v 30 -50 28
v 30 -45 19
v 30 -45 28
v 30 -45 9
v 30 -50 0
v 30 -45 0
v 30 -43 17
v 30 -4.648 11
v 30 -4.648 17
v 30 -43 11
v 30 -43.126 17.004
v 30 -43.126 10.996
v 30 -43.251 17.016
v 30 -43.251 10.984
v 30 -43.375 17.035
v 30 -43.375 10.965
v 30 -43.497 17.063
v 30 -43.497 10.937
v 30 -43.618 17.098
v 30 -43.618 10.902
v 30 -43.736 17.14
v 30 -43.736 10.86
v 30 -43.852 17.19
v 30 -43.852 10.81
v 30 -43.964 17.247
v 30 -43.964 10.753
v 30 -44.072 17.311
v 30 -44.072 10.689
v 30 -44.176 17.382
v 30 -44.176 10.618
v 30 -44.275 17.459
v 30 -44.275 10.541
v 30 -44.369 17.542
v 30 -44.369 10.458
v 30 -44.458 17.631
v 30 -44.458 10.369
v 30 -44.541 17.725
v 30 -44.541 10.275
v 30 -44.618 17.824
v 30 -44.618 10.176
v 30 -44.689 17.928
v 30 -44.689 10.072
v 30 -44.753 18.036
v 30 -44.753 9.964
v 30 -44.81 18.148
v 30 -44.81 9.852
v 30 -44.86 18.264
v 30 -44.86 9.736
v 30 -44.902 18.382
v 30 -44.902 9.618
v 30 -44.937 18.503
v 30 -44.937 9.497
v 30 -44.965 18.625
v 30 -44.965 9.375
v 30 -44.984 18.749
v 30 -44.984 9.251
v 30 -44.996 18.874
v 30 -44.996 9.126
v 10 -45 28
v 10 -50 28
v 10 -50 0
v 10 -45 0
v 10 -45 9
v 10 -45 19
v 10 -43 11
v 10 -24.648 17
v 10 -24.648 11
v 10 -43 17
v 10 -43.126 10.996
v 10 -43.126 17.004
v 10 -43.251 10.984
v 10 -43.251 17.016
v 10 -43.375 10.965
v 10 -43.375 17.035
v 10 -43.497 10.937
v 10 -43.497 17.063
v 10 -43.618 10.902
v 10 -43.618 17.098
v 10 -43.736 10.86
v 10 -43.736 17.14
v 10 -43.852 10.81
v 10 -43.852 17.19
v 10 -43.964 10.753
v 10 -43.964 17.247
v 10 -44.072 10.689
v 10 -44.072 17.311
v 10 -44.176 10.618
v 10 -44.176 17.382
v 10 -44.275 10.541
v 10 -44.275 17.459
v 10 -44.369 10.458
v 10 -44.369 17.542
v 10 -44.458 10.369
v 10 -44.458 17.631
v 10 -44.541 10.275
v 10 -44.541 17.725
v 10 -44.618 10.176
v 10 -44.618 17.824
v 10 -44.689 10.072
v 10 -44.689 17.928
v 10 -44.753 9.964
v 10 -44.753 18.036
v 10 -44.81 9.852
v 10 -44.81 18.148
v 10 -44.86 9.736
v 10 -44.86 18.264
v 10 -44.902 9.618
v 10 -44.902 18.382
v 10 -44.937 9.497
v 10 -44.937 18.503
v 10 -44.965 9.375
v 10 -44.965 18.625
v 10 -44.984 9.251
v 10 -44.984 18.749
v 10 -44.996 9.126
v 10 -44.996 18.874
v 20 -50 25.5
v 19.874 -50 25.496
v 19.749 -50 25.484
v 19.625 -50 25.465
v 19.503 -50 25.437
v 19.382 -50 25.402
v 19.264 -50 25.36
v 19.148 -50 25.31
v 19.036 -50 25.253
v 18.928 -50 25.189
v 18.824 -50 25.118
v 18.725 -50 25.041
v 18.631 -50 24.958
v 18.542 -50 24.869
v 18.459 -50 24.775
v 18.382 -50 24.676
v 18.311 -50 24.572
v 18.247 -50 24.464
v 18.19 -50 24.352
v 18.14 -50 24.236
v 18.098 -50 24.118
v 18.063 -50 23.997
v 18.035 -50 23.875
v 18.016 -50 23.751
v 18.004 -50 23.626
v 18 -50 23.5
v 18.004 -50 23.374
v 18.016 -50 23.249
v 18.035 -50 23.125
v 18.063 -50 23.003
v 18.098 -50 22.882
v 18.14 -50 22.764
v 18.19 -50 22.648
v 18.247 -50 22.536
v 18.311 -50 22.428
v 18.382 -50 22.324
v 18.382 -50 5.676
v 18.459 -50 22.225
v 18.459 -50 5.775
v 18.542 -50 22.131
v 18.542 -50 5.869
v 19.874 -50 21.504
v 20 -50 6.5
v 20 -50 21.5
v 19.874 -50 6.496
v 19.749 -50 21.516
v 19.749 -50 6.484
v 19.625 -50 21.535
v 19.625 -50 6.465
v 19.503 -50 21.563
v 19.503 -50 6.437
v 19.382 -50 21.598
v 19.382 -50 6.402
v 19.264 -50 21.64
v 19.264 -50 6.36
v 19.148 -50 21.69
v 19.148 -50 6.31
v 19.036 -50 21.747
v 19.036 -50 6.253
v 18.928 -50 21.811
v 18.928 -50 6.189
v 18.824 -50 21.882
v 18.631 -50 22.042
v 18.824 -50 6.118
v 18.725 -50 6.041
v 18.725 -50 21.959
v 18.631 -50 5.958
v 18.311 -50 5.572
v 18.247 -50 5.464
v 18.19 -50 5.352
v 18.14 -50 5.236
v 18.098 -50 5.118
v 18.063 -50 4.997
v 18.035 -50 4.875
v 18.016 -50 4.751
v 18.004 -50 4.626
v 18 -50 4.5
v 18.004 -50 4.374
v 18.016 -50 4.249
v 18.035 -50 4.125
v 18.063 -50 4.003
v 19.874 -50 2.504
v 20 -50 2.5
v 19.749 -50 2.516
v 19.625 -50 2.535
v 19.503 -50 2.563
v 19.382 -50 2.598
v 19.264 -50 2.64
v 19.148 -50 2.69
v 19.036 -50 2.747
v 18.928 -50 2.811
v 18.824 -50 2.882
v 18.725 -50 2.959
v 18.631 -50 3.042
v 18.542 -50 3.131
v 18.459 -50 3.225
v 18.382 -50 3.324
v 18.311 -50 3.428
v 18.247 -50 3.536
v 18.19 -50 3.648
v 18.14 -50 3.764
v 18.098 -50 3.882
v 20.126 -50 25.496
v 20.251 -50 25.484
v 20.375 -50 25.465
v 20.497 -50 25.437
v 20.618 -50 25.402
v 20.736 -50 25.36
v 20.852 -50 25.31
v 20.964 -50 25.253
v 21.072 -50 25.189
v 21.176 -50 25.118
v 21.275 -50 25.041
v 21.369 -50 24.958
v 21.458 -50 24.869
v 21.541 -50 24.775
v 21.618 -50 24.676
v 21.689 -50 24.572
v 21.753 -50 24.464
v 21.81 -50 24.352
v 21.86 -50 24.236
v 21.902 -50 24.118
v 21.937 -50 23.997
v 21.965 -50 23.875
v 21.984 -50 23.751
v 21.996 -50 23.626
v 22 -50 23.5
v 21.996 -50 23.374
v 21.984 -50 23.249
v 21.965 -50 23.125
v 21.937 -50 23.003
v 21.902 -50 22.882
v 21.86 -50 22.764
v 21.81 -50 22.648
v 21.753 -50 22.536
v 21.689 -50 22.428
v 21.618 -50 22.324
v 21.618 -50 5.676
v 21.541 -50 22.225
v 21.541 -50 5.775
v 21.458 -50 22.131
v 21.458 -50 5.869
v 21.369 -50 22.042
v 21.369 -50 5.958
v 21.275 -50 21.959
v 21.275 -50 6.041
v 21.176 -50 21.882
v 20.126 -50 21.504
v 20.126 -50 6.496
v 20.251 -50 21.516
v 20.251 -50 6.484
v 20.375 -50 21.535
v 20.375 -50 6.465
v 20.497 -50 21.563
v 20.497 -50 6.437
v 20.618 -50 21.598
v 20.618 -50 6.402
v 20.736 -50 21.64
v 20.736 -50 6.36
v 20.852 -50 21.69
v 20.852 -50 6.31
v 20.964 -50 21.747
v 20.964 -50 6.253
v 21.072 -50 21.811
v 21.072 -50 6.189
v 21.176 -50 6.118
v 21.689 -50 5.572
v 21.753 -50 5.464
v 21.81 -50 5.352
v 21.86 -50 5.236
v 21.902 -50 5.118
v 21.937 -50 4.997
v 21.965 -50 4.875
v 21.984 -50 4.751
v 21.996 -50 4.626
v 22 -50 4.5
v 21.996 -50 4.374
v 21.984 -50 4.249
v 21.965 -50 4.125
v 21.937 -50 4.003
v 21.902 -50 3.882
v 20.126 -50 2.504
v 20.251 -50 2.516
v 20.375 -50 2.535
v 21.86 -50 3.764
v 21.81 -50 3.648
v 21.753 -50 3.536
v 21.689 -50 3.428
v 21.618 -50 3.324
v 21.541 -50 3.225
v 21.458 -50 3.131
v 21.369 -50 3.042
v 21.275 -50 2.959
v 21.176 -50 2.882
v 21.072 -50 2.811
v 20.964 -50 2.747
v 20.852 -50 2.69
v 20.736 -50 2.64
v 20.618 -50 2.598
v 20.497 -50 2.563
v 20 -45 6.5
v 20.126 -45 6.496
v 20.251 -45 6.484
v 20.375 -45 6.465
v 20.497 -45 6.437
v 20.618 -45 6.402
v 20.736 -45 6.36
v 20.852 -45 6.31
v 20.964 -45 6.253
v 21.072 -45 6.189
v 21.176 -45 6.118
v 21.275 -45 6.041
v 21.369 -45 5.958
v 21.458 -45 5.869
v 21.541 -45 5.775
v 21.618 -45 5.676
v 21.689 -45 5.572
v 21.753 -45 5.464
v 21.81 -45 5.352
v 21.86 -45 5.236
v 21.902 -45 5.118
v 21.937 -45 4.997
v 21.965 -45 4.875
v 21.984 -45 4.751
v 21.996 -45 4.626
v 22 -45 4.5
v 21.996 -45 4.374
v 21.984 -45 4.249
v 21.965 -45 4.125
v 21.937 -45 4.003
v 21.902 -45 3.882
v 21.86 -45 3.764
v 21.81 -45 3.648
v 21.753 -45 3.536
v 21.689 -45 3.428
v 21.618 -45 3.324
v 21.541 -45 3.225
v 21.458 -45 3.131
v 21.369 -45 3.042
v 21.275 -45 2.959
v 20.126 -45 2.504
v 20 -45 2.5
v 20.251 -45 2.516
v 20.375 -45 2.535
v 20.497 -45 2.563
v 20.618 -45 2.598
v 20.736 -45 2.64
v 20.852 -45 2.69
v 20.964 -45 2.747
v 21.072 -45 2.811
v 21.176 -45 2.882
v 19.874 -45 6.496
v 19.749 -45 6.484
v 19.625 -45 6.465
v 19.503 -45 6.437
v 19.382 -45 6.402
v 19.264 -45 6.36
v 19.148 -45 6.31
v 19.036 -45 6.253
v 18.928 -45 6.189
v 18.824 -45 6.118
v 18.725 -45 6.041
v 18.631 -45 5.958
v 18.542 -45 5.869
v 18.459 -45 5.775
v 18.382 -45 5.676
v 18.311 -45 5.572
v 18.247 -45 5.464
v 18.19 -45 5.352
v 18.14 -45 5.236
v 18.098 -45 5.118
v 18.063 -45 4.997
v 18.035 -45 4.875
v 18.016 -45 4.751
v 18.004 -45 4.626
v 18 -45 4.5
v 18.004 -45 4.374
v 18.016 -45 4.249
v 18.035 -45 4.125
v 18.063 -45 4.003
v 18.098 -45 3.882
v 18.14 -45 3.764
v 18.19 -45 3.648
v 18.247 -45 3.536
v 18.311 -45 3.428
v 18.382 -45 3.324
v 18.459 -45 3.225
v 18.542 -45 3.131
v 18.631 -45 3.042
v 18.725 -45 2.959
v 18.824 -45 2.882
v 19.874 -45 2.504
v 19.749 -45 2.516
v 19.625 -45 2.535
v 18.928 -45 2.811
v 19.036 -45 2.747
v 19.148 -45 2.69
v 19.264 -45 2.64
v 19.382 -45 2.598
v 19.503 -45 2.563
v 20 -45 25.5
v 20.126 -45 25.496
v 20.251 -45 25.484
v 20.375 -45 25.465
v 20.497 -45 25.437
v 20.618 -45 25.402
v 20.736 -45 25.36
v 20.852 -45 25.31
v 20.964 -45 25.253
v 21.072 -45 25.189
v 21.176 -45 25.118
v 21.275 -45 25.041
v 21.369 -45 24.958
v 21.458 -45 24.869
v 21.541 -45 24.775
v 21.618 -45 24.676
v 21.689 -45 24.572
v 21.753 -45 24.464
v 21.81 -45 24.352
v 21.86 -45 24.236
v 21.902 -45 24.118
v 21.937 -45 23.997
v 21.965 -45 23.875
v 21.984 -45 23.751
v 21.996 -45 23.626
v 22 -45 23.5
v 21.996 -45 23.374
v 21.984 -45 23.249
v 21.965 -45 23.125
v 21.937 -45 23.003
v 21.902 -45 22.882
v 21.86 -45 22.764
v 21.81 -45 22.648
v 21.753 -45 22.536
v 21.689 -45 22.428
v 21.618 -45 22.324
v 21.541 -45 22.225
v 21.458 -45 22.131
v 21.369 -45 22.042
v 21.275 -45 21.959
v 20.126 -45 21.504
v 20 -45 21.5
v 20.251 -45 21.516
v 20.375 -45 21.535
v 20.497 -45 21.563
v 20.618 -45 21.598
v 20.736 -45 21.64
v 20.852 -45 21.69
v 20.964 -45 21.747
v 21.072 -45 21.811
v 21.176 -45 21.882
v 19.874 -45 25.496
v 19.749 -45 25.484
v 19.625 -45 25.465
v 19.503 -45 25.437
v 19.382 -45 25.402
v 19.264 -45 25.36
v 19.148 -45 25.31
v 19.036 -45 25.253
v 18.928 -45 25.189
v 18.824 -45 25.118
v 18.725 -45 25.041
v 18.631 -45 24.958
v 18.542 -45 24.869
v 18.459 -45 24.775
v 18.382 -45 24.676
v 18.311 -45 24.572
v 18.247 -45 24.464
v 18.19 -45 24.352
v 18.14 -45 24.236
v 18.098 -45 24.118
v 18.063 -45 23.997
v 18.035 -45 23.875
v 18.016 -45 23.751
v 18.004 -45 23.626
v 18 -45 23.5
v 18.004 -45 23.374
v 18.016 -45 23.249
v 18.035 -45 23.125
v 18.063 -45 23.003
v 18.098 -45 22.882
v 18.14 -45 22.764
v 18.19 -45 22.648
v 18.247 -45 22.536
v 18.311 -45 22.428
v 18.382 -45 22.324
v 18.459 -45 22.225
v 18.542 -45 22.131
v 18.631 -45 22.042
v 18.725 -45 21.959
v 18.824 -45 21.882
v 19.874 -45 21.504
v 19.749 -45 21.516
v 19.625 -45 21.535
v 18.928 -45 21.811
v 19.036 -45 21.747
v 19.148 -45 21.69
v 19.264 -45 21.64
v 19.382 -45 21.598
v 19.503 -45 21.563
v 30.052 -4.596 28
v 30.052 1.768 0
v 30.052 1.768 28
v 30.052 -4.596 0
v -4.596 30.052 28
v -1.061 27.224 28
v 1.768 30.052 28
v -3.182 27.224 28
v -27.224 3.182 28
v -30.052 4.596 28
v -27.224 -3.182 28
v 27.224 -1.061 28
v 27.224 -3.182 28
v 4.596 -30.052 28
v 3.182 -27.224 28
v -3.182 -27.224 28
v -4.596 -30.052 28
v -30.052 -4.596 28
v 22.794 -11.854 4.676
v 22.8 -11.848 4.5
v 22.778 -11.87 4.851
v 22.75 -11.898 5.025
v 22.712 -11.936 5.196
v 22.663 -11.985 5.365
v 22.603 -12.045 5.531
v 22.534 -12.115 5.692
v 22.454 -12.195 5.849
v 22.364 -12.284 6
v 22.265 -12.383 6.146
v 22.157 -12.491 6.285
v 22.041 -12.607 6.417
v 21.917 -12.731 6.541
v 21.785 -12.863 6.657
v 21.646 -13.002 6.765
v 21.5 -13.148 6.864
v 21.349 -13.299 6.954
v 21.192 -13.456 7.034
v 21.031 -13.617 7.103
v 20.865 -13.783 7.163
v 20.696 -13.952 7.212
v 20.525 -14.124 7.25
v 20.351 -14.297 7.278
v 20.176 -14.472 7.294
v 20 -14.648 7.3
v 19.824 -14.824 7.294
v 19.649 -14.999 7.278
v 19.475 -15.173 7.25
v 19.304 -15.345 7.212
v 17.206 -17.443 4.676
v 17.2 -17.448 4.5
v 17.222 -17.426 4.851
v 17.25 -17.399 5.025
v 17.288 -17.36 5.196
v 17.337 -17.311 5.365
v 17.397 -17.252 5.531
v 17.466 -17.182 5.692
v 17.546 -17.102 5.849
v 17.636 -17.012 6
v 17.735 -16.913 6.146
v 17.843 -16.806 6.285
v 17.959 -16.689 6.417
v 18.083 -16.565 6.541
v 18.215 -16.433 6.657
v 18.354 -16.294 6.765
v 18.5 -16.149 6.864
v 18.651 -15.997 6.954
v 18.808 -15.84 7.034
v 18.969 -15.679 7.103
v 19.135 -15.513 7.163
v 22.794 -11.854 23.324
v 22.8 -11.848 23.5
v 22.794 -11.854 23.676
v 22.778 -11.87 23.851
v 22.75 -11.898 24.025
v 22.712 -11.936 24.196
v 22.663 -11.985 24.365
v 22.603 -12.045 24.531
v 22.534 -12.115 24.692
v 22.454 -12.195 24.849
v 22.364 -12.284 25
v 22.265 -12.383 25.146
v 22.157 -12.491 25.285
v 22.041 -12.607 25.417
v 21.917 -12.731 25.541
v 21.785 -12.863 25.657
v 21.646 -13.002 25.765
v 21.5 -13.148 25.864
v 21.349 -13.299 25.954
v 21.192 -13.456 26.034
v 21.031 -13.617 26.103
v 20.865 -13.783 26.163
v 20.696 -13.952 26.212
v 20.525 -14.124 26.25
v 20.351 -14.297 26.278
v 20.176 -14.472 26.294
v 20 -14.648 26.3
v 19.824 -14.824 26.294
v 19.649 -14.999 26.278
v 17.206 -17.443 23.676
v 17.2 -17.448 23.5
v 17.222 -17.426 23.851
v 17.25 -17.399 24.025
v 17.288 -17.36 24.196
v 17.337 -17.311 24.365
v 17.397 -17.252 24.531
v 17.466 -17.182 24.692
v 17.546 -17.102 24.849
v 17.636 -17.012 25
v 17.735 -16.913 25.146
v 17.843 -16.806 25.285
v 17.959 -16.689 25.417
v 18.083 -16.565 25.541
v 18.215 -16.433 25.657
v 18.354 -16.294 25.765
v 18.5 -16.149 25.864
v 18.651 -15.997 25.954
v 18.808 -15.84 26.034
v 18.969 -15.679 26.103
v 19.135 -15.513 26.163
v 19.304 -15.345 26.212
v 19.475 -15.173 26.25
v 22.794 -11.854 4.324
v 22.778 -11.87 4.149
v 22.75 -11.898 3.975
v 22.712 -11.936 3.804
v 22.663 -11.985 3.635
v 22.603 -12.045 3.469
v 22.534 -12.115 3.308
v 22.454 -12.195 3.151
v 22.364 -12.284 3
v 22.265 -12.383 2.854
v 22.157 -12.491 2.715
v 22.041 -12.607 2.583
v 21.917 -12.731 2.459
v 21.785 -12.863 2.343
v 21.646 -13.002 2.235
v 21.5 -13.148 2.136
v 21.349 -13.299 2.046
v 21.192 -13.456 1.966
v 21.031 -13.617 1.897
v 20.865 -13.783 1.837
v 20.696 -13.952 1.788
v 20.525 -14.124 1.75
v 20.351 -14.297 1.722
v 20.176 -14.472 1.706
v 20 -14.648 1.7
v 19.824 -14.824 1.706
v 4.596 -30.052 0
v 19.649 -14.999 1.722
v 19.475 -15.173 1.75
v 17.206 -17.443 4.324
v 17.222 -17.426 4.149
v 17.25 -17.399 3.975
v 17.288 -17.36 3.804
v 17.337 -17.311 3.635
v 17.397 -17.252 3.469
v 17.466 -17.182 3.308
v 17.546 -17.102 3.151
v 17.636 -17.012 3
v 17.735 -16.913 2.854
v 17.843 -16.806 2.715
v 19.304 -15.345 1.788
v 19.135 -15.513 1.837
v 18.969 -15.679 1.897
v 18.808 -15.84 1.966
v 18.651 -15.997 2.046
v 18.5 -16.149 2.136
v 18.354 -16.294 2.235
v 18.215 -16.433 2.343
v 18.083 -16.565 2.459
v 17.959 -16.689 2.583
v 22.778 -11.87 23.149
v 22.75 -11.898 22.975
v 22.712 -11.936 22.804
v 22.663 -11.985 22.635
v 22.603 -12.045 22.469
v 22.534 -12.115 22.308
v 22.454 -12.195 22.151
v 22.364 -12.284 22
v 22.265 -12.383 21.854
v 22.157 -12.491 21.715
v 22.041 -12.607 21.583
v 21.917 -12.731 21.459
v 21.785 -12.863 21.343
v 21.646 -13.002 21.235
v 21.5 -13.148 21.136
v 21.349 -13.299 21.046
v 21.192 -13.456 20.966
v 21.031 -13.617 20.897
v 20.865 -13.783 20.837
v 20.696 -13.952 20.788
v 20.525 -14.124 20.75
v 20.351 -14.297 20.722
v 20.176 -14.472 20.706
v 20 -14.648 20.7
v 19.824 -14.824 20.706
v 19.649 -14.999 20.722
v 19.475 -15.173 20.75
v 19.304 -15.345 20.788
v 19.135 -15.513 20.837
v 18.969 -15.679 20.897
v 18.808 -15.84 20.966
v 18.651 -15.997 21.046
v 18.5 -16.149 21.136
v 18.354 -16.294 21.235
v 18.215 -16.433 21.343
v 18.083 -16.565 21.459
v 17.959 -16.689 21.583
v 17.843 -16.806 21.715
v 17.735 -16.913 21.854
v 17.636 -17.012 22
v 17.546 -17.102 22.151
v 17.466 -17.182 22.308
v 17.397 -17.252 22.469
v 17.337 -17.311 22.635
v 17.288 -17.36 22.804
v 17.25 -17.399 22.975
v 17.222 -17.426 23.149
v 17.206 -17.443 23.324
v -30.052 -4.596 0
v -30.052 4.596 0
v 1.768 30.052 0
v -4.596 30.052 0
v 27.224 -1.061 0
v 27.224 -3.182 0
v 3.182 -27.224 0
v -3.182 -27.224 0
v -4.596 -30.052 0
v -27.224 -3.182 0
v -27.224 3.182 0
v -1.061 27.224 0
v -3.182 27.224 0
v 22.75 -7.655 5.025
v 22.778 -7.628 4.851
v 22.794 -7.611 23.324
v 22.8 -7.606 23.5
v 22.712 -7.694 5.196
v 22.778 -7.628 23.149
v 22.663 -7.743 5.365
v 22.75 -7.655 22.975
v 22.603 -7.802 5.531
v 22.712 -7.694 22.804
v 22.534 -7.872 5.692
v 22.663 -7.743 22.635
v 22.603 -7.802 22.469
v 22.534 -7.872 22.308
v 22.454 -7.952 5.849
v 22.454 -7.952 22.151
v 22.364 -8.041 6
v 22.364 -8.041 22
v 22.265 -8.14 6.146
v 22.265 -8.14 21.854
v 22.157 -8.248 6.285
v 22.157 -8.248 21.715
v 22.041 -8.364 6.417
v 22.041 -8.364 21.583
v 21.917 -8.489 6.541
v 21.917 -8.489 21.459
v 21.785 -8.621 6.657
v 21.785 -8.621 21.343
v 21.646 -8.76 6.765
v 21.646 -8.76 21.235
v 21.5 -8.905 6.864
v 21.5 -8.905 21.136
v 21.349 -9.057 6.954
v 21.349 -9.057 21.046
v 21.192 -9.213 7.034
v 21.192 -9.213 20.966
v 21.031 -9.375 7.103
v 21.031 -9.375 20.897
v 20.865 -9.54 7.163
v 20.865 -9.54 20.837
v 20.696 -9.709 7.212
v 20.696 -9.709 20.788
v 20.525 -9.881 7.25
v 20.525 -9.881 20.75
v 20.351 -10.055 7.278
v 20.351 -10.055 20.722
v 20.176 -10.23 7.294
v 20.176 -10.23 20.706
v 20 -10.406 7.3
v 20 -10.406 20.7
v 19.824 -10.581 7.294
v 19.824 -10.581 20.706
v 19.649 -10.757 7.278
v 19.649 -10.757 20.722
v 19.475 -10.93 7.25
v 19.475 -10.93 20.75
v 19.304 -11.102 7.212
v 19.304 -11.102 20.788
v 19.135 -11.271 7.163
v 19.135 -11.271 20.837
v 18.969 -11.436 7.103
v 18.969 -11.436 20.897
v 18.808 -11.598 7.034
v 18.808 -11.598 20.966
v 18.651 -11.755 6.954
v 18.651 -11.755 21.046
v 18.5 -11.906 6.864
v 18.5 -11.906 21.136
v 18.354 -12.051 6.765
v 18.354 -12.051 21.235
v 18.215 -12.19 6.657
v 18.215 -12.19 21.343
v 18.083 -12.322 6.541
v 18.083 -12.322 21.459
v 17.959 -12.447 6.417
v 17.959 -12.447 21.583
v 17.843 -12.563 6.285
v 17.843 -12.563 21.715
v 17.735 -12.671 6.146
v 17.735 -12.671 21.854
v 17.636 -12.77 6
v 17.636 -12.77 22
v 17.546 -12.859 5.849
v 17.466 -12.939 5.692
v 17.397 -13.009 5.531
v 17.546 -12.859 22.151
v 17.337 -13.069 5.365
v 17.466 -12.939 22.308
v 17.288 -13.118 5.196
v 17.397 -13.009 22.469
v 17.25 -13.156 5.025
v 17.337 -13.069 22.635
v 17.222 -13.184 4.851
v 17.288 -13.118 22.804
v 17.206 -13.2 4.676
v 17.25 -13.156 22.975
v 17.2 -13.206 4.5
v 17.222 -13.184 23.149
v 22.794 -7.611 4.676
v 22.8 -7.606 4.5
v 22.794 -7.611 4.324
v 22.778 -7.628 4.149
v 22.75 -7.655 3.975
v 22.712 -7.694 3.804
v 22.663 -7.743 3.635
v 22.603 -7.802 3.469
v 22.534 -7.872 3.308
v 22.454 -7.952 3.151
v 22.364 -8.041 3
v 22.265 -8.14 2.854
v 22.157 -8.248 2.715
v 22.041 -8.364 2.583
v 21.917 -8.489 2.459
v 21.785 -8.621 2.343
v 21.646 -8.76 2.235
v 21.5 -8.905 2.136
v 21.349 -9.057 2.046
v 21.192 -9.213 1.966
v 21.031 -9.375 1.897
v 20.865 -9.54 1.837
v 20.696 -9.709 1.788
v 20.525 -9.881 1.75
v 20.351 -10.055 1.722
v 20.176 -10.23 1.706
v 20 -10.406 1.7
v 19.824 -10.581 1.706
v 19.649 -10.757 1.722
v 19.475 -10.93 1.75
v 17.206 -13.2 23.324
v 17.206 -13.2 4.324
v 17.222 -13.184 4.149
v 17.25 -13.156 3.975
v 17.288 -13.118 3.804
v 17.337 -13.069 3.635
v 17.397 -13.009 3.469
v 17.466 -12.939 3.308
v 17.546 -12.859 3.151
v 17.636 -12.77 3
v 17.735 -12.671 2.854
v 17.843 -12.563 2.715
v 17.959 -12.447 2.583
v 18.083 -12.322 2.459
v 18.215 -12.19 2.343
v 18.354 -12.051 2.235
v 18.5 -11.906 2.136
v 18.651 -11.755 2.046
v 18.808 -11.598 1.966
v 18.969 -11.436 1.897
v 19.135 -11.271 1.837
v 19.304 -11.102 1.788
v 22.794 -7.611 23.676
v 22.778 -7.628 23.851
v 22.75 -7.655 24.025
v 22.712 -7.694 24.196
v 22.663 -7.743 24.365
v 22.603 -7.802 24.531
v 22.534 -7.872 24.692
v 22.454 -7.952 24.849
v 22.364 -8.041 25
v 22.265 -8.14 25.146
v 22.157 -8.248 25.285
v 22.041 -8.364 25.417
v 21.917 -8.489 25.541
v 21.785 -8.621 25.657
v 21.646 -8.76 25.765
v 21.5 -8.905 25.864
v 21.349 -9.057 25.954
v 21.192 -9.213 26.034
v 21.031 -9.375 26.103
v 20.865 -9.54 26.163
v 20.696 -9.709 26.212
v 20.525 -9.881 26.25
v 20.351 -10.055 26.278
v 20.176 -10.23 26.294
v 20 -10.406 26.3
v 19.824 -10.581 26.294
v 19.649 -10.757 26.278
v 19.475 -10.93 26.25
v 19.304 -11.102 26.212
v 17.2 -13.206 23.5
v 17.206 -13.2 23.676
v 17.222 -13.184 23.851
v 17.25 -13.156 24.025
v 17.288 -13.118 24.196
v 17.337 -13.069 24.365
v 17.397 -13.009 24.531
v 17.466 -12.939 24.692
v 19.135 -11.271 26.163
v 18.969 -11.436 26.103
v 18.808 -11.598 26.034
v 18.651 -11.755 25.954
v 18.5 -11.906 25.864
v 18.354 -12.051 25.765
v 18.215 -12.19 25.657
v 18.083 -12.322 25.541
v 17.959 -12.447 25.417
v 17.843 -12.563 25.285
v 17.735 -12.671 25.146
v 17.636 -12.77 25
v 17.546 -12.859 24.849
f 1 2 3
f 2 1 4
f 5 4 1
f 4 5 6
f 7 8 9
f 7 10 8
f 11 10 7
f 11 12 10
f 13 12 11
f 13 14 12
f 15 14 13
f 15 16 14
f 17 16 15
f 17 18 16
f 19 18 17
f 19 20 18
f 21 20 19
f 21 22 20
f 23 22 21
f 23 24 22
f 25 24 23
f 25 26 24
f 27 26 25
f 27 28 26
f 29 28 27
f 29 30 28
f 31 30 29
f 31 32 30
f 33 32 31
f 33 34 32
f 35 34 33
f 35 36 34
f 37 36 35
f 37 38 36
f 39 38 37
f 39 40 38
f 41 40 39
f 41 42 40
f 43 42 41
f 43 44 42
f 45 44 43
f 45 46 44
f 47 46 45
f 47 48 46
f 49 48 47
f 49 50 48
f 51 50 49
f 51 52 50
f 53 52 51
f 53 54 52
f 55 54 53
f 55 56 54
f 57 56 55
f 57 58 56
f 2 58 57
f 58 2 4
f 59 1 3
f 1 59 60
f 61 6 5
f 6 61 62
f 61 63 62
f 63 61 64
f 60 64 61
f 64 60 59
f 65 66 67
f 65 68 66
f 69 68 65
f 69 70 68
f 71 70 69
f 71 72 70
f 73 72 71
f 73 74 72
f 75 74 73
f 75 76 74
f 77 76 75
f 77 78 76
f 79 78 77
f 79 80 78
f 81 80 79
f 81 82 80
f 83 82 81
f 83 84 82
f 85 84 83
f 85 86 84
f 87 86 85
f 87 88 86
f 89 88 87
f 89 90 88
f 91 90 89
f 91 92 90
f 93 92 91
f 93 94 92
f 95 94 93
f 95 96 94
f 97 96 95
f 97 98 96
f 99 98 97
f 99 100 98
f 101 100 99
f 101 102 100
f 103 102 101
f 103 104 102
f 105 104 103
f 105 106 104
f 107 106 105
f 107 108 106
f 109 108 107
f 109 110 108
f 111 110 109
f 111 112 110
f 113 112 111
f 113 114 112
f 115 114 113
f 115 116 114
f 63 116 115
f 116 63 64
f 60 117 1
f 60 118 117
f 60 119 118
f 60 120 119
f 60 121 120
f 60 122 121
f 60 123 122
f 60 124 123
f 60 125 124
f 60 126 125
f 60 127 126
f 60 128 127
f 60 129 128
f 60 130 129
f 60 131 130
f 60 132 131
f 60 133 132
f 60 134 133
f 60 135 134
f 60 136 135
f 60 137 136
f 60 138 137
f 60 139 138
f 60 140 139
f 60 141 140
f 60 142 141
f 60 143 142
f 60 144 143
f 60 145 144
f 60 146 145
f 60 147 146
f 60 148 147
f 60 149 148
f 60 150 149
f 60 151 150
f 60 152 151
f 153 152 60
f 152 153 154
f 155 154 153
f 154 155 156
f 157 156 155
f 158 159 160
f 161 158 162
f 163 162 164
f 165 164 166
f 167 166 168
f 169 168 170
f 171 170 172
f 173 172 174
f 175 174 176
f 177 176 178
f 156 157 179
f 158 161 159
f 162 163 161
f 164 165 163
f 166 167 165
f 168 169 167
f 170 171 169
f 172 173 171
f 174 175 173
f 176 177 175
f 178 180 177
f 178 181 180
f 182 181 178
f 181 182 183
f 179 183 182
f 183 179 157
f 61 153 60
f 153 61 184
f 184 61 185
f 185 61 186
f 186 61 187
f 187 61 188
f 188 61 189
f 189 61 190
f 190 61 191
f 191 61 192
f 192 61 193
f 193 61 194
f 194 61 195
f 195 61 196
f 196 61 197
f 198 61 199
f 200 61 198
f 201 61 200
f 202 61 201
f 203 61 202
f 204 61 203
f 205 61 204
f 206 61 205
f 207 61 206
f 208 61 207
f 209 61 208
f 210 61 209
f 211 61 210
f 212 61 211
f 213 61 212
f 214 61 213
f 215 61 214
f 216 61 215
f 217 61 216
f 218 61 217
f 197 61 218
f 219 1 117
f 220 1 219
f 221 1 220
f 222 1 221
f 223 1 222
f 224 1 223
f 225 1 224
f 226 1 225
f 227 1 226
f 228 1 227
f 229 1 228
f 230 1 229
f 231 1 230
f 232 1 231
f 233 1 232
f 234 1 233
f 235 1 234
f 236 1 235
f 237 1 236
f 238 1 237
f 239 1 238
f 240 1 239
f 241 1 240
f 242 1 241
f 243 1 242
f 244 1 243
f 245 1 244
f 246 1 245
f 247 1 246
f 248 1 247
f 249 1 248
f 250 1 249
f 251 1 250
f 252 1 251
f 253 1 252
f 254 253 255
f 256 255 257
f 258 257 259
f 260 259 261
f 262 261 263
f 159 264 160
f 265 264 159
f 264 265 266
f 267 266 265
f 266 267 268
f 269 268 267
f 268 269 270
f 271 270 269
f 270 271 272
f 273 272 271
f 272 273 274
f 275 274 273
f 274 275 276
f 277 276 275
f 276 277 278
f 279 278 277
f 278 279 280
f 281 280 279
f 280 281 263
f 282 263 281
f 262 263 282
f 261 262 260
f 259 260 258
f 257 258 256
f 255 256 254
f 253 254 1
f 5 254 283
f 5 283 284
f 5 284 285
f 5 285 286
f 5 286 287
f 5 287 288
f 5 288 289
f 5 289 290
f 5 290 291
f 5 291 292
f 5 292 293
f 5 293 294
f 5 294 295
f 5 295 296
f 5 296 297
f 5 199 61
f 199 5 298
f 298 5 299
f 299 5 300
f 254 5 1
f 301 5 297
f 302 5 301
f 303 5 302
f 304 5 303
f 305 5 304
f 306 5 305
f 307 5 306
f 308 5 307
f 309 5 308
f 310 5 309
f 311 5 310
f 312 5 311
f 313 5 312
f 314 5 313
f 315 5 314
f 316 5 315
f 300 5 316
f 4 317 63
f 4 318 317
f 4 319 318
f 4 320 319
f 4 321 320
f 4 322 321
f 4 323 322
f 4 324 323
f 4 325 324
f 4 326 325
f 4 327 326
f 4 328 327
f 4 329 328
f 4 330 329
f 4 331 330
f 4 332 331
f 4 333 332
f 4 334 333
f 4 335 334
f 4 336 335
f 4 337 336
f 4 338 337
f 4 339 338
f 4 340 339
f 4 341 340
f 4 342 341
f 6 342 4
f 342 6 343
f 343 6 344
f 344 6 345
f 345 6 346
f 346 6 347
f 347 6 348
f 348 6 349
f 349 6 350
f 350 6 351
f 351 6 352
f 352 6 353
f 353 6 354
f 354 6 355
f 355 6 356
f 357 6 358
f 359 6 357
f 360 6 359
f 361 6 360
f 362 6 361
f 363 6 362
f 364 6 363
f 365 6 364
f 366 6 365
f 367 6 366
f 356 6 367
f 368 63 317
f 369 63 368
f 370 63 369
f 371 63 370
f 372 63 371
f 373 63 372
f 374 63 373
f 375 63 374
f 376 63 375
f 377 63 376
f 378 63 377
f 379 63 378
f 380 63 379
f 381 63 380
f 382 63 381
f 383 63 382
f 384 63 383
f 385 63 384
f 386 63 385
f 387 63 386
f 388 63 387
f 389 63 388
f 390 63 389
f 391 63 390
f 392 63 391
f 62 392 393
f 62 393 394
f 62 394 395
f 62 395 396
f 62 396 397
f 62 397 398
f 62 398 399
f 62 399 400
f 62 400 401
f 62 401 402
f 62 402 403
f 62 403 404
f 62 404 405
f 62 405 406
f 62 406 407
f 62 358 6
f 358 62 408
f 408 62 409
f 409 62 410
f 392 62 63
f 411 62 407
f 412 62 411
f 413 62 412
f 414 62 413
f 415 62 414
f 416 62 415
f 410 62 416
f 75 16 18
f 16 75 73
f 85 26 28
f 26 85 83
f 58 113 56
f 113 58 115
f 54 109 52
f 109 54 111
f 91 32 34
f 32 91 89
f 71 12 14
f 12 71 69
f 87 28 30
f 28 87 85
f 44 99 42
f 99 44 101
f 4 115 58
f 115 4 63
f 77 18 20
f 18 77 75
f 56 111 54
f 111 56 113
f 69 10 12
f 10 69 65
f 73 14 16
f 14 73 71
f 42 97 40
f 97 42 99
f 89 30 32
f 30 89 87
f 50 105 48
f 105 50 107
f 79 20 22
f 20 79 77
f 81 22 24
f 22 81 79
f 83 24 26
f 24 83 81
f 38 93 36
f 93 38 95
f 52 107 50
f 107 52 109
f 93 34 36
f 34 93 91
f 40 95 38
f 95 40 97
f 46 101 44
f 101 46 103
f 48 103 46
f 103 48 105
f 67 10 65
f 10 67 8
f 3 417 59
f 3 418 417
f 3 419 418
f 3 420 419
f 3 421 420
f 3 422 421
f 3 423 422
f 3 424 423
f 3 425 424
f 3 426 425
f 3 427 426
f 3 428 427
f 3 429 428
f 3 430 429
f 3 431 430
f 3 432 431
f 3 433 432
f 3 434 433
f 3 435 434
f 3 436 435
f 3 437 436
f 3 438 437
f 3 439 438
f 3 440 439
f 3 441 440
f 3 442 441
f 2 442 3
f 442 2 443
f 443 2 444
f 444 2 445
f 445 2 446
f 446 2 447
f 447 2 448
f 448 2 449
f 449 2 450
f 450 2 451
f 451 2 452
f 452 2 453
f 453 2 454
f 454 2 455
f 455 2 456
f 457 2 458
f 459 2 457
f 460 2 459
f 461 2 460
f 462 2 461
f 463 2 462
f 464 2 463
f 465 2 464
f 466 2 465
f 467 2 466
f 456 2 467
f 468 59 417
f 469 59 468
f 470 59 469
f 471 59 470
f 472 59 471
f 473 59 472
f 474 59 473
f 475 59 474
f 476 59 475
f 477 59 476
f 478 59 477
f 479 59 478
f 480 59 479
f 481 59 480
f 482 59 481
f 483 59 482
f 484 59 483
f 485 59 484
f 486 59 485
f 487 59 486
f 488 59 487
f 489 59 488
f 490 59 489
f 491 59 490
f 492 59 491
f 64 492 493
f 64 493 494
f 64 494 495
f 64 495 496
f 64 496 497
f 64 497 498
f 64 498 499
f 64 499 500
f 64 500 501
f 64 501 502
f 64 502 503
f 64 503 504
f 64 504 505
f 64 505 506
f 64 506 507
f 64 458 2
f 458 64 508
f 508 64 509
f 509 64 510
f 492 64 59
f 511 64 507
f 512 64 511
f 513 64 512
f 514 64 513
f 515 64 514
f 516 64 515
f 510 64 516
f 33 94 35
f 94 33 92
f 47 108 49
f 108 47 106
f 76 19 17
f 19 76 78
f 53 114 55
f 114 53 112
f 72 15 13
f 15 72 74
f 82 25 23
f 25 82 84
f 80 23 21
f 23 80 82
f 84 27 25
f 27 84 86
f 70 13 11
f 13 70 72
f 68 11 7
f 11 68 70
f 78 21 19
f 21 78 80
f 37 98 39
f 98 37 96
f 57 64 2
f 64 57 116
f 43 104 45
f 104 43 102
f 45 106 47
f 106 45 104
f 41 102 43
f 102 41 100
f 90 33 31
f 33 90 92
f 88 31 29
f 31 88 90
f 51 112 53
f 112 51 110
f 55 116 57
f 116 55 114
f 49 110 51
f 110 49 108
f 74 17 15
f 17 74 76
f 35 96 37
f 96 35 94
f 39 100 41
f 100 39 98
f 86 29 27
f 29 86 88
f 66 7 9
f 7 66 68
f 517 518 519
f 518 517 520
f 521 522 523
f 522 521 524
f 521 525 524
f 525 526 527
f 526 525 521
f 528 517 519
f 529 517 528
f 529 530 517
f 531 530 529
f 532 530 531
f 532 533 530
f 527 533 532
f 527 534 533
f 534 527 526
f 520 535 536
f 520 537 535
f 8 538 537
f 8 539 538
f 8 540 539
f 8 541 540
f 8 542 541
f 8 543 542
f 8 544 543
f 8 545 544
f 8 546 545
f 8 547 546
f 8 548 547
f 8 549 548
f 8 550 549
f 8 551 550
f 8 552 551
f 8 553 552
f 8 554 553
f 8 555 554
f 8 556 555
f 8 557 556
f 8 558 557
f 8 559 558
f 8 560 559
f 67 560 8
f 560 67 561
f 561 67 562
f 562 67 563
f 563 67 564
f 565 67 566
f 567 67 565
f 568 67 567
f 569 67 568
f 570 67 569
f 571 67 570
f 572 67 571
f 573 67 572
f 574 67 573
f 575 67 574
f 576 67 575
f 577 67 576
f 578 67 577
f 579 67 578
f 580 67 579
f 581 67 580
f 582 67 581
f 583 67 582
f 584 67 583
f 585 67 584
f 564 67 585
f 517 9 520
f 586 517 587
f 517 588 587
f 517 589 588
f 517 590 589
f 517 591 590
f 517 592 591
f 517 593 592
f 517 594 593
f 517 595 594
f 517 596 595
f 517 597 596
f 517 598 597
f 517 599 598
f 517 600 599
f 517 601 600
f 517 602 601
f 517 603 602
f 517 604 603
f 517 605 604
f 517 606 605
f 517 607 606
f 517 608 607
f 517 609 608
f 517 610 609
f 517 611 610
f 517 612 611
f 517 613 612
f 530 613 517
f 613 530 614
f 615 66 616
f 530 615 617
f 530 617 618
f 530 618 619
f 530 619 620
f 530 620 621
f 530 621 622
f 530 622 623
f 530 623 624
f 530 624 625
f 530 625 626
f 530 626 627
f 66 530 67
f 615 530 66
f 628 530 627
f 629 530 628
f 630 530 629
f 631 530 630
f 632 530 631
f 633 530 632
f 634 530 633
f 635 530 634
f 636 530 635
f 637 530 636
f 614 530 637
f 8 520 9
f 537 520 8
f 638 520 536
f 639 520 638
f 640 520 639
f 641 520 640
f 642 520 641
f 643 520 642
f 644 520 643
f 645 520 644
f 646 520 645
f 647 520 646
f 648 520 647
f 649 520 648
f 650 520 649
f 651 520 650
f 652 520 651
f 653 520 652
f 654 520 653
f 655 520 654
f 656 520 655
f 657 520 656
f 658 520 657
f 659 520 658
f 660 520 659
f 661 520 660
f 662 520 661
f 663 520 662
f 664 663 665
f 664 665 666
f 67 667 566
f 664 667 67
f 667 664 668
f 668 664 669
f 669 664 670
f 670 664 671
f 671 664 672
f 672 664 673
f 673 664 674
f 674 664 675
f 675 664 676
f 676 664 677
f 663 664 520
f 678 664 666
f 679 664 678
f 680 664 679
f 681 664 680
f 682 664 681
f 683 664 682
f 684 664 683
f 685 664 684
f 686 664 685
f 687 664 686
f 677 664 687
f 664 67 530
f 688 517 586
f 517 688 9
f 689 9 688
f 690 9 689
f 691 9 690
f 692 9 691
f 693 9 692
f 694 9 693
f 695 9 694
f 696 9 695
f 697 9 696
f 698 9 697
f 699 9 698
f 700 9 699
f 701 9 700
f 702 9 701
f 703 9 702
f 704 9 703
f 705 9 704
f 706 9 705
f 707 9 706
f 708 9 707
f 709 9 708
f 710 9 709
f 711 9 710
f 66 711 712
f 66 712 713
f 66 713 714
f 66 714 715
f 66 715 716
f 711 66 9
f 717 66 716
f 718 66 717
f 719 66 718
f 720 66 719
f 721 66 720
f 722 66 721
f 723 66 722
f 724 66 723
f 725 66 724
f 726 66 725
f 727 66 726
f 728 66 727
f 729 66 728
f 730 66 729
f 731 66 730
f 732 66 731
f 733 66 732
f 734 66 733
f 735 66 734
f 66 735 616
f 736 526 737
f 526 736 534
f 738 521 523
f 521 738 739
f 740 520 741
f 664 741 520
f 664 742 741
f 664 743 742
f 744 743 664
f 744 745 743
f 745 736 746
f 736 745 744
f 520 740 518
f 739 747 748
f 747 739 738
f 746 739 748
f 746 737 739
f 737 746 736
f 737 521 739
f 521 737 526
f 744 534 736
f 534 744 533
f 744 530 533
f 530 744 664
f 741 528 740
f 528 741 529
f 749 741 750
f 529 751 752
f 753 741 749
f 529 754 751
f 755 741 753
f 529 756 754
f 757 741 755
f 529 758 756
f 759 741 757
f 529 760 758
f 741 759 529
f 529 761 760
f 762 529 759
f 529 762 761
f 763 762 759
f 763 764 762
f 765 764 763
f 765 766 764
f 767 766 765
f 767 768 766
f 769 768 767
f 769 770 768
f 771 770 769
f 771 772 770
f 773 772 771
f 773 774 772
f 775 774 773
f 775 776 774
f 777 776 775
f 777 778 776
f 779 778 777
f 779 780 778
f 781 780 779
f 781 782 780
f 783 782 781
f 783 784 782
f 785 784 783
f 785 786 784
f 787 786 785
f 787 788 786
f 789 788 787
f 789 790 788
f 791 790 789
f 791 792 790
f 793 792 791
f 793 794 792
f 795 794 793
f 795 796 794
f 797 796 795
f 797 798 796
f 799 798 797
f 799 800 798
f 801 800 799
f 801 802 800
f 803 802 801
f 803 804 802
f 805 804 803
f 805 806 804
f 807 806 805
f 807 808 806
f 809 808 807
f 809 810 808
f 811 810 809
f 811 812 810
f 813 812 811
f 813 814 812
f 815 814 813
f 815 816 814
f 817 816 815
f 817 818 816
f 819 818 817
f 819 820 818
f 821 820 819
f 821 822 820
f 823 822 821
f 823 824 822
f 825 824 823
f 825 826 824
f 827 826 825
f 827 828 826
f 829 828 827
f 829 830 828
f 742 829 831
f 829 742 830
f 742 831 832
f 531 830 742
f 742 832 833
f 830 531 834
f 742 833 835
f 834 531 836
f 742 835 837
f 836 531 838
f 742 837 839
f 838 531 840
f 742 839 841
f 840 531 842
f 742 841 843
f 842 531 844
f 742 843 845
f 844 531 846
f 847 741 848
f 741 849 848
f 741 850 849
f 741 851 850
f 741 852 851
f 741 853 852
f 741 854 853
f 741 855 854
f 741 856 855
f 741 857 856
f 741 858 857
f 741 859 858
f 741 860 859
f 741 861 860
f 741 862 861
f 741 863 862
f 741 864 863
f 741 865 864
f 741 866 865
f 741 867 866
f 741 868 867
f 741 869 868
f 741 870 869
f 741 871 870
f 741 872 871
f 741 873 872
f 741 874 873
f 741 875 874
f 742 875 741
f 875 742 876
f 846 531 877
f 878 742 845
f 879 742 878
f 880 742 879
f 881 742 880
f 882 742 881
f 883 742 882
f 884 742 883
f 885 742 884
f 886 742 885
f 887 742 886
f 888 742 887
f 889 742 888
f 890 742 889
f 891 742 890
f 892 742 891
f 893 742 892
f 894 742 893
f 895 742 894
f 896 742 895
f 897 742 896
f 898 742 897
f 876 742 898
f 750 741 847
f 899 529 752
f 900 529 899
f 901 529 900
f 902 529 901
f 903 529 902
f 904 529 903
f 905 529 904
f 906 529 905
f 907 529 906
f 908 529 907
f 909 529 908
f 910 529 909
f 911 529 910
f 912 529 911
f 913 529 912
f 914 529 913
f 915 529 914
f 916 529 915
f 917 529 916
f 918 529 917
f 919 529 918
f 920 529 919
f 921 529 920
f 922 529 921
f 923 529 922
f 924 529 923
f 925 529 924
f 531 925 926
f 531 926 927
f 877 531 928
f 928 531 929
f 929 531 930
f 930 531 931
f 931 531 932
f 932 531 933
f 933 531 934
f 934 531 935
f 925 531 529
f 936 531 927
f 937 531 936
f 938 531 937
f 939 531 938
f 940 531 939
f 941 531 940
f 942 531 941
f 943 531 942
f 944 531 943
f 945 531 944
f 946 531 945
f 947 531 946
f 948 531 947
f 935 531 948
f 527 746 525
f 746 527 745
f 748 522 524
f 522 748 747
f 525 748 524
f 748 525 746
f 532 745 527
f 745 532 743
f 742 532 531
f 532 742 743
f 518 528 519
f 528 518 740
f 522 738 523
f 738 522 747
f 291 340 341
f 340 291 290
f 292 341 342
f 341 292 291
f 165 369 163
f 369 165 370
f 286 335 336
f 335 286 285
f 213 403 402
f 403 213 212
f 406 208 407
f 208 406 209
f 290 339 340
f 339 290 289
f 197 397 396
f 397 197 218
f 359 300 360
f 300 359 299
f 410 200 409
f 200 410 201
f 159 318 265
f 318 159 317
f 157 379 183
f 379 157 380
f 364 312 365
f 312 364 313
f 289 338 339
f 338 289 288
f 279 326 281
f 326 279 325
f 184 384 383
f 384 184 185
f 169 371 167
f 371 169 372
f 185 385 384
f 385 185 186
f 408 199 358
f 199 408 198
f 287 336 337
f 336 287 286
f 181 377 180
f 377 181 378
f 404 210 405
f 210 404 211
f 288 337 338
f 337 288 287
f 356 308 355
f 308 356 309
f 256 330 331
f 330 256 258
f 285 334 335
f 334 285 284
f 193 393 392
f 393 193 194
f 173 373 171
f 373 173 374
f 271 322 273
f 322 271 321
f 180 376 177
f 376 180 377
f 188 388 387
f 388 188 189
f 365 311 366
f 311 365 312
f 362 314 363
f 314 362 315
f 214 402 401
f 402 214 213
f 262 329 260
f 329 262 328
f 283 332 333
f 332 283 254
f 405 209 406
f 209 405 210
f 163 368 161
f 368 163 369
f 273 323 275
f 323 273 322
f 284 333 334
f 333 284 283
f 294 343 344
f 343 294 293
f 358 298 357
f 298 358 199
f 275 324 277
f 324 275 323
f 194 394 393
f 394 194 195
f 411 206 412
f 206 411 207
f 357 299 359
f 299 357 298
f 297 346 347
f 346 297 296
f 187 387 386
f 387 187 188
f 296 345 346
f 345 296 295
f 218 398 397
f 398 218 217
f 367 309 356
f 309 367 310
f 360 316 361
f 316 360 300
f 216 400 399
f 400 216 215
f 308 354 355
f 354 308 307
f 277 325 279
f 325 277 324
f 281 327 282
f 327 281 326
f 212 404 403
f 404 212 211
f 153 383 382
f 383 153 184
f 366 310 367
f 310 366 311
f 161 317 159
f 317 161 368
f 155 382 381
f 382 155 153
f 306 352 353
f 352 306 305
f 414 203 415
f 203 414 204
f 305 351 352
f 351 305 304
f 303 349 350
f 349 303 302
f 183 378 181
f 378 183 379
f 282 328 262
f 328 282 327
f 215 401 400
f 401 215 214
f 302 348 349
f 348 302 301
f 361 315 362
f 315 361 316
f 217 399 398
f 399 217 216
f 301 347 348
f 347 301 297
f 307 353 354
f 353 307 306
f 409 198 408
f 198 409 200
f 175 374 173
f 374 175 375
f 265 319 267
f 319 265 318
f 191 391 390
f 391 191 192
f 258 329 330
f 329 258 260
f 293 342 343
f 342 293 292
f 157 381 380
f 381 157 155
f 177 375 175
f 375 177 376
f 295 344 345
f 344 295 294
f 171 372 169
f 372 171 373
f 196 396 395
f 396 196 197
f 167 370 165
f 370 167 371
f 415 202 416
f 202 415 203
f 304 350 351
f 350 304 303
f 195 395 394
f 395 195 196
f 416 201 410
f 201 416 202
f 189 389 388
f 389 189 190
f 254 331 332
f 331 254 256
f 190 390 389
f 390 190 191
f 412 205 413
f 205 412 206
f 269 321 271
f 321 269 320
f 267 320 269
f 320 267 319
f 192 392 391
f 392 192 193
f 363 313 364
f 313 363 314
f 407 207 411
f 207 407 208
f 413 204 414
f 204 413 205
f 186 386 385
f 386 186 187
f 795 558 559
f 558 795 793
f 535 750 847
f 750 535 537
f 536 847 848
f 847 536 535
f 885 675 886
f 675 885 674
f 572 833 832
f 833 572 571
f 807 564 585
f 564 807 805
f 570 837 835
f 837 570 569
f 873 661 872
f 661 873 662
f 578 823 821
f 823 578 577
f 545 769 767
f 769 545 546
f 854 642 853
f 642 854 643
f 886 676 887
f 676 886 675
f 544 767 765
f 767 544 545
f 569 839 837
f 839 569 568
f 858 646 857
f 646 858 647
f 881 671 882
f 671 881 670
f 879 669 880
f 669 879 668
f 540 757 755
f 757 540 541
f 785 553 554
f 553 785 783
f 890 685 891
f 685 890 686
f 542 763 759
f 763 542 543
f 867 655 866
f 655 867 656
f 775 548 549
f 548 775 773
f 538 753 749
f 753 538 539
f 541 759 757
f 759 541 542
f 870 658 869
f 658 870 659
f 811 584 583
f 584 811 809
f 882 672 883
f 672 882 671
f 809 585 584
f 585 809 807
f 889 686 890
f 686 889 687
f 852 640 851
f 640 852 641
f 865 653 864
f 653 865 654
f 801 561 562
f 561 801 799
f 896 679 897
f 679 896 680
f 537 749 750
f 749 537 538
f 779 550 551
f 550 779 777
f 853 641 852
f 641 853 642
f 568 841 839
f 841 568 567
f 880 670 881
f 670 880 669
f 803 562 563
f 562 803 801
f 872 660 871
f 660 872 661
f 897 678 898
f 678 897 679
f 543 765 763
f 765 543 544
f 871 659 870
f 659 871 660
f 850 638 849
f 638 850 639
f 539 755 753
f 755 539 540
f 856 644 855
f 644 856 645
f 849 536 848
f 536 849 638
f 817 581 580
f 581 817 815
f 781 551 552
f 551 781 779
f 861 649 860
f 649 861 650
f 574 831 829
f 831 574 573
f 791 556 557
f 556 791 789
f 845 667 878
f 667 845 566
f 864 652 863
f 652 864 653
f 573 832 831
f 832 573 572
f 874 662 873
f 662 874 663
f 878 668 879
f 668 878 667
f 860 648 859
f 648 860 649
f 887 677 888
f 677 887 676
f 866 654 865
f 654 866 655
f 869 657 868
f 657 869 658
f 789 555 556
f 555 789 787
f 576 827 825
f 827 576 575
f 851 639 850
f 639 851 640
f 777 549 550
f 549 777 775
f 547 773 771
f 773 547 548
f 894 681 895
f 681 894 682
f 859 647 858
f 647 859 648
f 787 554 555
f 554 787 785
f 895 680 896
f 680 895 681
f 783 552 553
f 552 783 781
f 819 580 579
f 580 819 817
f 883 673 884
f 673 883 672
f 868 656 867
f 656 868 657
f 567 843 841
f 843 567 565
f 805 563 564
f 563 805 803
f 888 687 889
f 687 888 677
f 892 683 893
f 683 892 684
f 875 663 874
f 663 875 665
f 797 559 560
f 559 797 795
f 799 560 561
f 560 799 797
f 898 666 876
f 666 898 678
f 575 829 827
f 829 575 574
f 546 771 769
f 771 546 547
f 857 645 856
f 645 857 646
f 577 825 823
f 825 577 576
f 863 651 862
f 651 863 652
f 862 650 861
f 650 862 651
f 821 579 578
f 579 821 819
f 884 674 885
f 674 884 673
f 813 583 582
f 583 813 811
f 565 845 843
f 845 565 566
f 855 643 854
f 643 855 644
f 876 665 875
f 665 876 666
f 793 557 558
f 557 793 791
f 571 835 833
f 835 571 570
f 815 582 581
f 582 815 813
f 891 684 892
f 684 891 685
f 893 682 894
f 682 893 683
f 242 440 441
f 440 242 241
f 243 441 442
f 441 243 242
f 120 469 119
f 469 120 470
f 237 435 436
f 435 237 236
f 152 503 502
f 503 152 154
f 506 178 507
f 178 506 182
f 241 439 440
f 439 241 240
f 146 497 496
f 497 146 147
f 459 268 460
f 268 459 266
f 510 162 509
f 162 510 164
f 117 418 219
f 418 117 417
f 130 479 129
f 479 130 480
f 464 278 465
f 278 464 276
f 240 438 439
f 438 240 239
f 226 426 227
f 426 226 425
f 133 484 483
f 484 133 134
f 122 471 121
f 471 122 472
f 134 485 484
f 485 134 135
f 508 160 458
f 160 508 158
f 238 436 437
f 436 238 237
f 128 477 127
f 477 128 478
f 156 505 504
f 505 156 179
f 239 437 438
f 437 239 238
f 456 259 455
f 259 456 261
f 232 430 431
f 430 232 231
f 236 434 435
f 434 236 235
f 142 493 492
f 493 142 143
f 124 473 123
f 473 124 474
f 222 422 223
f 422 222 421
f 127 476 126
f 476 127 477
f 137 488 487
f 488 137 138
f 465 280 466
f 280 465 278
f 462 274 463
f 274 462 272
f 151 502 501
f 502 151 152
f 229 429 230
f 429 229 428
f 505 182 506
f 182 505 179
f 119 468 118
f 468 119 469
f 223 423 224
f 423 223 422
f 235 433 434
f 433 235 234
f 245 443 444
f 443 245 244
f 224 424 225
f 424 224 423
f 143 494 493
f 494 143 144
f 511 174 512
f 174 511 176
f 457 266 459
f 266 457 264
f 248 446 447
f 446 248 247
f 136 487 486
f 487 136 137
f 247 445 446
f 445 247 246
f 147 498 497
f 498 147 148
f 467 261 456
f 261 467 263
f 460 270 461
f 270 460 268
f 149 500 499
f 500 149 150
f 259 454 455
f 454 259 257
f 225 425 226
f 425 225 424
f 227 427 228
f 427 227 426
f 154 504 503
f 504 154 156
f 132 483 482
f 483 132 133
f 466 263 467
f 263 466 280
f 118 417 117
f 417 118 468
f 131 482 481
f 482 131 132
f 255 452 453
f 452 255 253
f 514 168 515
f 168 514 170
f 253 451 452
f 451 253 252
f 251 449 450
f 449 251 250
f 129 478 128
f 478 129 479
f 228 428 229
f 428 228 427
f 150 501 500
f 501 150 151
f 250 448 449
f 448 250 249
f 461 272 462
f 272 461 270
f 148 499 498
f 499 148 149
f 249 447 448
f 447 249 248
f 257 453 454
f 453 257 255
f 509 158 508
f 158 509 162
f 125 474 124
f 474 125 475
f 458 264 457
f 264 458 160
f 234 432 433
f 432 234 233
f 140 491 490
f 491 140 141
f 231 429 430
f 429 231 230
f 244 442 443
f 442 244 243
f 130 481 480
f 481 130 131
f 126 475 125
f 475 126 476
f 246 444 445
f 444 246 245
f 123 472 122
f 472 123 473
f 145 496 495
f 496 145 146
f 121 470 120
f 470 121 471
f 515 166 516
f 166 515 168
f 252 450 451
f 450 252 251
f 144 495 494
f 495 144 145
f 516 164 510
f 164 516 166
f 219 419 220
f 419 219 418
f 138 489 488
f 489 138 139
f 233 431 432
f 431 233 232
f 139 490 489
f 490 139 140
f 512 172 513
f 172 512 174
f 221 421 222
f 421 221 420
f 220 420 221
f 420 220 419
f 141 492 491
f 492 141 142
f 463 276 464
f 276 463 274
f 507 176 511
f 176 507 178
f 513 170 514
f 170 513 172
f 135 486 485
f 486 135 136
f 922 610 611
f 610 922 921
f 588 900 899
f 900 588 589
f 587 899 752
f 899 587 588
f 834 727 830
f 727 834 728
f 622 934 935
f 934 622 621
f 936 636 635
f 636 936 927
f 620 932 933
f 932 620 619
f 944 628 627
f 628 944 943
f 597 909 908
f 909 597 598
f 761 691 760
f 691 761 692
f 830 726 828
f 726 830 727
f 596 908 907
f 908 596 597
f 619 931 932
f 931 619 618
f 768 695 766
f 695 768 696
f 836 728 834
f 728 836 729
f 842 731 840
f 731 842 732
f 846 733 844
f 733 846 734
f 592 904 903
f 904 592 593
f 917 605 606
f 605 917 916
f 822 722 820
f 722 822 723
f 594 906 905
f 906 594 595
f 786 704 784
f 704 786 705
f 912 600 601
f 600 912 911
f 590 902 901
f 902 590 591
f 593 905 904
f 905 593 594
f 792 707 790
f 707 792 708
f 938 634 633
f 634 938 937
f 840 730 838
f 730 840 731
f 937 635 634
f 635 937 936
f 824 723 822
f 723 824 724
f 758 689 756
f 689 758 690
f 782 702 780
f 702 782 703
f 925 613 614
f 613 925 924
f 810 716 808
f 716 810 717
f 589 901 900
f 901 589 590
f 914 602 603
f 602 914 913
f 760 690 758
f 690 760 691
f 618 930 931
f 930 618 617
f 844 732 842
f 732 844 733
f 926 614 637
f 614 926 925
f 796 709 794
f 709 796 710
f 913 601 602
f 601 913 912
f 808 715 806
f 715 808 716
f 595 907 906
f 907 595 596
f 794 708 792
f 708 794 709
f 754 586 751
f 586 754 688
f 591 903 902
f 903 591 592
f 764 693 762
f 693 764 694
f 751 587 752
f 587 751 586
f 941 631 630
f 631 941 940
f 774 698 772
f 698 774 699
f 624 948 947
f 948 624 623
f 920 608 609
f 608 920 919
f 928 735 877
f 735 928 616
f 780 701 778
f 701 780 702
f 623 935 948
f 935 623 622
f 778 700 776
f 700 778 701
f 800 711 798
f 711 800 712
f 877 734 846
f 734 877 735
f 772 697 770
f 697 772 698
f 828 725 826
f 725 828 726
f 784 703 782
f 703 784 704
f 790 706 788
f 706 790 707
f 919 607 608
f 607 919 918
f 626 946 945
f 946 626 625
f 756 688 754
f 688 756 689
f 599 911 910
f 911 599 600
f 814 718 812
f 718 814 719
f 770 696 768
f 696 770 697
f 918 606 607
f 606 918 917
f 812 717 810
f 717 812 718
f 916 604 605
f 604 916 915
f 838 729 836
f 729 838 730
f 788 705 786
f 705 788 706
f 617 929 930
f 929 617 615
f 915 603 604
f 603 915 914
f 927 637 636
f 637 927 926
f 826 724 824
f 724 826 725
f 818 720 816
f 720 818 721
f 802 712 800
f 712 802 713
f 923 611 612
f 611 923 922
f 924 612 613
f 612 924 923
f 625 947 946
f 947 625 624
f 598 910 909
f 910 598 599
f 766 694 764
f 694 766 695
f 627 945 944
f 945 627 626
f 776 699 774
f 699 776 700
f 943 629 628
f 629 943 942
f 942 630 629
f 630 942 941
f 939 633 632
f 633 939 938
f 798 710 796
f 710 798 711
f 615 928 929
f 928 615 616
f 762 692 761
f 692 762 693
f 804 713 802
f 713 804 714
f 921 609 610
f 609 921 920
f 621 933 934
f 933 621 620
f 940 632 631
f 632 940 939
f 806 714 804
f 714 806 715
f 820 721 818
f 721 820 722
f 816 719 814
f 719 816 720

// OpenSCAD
outer_length = 42.5 + 0.5;
chanfer_length = 13;
height = 28;
hole_dist = 4.5;

module shape( outer_length, chanfer_length, height ) {
    linear_extrude( height )
        polygon(
            [
                [ -outer_length / 2, -outer_length / 2 + chanfer_length / 2 ],
                [ -outer_length / 2 + chanfer_length / 2, -outer_length / 2 ],
                [  outer_length / 2 - chanfer_length / 2, -outer_length / 2 ],
                [  outer_length / 2, -outer_length / 2 + chanfer_length / 2 ],
                [  outer_length / 2,  outer_length / 2 - chanfer_length / 2 ],
                [  outer_length / 2 - chanfer_length / 2,  outer_length / 2 ],
                [ -outer_length / 2 + chanfer_length / 2, outer_length / 2 ],
                [ -outer_length / 2, outer_length / 2 - chanfer_length / 2 ]
            ]
        );
}

difference(){
    union(){
        rotate( -45, [ 0, 0, 1 ] )
            shape( outer_length + 6, chanfer_length, height );
        difference(){
            translate( [ 10, -50, 0 ] )
                cube( [ 20, 50, height ] );
            translate( [ 0, -45, -1 ] )
                cube( [ 100, 10, 2 *  hole_dist + 1 ] );
            translate( [ 0, my_radius - 45, 2 * hole_dist  ] )
                rotate( 90, [ 0, 1, 0 ] )
                    cylinder( r = my_radius, h = 100, $fn = 100 );
            translate( [ 0, -45 + my_radius, -1 ] )
                cube( [ 100, 100, 2 *  hole_dist + 1 + my_radius ] );
        
            translate( [ 0, -45, height - 2 *  hole_dist ] )
                cube( [ 100, 10, 2 *  hole_dist + 1 ] );
            translate( [ 0, my_radius - 45, height - 2 * hole_dist  ] )
                rotate( 90, [ 0, 1, 0 ] )
                    cylinder( r = my_radius, h = 100, $fn = 100 );
            translate( [ 0, -45 + my_radius, height - 2 * hole_dist - my_radius ] )
                cube( [ 100, 100, 2 *  hole_dist + 1 + my_radius ] );
        }        
}
    rotate( -45, [ 0, 0, 1 ] )
        translate( [ 0, 0, -1 ] )
            shape( outer_length, chanfer_length - 4, height + 2 );
    rotate( -45, [ 0, 0, 1 ] )
        translate( [ 0, 50, height / 2 ] )
            cube( [ outer_length - 3, 100, height + 2 ], center = true );
    
    translate( [ 20, -44, hole_dist  ] )
        rotate( 90, [ 1, 0, 0 ] )
            cylinder( r = 2, h = 10, $fn = 100 );
    translate( [ 20, 0, hole_dist  ] )
        rotate( 90, [ 1, 0, 0 ] )
             cylinder( r = 2.8, h = 25, $fn = 100 );

    translate( [ 20, -44, height - hole_dist  ] )
        rotate( 90, [ 1, 0, 0 ] )
             cylinder( r = 2, h = 10, $fn = 100 );
    translate( [ 20, 0, height - hole_dist  ] )
        rotate( 90, [ 1, 0, 0 ] )
            cylinder( r = 2.8, h = 25, $fn = 100 );
    }

my_radius = 2;
